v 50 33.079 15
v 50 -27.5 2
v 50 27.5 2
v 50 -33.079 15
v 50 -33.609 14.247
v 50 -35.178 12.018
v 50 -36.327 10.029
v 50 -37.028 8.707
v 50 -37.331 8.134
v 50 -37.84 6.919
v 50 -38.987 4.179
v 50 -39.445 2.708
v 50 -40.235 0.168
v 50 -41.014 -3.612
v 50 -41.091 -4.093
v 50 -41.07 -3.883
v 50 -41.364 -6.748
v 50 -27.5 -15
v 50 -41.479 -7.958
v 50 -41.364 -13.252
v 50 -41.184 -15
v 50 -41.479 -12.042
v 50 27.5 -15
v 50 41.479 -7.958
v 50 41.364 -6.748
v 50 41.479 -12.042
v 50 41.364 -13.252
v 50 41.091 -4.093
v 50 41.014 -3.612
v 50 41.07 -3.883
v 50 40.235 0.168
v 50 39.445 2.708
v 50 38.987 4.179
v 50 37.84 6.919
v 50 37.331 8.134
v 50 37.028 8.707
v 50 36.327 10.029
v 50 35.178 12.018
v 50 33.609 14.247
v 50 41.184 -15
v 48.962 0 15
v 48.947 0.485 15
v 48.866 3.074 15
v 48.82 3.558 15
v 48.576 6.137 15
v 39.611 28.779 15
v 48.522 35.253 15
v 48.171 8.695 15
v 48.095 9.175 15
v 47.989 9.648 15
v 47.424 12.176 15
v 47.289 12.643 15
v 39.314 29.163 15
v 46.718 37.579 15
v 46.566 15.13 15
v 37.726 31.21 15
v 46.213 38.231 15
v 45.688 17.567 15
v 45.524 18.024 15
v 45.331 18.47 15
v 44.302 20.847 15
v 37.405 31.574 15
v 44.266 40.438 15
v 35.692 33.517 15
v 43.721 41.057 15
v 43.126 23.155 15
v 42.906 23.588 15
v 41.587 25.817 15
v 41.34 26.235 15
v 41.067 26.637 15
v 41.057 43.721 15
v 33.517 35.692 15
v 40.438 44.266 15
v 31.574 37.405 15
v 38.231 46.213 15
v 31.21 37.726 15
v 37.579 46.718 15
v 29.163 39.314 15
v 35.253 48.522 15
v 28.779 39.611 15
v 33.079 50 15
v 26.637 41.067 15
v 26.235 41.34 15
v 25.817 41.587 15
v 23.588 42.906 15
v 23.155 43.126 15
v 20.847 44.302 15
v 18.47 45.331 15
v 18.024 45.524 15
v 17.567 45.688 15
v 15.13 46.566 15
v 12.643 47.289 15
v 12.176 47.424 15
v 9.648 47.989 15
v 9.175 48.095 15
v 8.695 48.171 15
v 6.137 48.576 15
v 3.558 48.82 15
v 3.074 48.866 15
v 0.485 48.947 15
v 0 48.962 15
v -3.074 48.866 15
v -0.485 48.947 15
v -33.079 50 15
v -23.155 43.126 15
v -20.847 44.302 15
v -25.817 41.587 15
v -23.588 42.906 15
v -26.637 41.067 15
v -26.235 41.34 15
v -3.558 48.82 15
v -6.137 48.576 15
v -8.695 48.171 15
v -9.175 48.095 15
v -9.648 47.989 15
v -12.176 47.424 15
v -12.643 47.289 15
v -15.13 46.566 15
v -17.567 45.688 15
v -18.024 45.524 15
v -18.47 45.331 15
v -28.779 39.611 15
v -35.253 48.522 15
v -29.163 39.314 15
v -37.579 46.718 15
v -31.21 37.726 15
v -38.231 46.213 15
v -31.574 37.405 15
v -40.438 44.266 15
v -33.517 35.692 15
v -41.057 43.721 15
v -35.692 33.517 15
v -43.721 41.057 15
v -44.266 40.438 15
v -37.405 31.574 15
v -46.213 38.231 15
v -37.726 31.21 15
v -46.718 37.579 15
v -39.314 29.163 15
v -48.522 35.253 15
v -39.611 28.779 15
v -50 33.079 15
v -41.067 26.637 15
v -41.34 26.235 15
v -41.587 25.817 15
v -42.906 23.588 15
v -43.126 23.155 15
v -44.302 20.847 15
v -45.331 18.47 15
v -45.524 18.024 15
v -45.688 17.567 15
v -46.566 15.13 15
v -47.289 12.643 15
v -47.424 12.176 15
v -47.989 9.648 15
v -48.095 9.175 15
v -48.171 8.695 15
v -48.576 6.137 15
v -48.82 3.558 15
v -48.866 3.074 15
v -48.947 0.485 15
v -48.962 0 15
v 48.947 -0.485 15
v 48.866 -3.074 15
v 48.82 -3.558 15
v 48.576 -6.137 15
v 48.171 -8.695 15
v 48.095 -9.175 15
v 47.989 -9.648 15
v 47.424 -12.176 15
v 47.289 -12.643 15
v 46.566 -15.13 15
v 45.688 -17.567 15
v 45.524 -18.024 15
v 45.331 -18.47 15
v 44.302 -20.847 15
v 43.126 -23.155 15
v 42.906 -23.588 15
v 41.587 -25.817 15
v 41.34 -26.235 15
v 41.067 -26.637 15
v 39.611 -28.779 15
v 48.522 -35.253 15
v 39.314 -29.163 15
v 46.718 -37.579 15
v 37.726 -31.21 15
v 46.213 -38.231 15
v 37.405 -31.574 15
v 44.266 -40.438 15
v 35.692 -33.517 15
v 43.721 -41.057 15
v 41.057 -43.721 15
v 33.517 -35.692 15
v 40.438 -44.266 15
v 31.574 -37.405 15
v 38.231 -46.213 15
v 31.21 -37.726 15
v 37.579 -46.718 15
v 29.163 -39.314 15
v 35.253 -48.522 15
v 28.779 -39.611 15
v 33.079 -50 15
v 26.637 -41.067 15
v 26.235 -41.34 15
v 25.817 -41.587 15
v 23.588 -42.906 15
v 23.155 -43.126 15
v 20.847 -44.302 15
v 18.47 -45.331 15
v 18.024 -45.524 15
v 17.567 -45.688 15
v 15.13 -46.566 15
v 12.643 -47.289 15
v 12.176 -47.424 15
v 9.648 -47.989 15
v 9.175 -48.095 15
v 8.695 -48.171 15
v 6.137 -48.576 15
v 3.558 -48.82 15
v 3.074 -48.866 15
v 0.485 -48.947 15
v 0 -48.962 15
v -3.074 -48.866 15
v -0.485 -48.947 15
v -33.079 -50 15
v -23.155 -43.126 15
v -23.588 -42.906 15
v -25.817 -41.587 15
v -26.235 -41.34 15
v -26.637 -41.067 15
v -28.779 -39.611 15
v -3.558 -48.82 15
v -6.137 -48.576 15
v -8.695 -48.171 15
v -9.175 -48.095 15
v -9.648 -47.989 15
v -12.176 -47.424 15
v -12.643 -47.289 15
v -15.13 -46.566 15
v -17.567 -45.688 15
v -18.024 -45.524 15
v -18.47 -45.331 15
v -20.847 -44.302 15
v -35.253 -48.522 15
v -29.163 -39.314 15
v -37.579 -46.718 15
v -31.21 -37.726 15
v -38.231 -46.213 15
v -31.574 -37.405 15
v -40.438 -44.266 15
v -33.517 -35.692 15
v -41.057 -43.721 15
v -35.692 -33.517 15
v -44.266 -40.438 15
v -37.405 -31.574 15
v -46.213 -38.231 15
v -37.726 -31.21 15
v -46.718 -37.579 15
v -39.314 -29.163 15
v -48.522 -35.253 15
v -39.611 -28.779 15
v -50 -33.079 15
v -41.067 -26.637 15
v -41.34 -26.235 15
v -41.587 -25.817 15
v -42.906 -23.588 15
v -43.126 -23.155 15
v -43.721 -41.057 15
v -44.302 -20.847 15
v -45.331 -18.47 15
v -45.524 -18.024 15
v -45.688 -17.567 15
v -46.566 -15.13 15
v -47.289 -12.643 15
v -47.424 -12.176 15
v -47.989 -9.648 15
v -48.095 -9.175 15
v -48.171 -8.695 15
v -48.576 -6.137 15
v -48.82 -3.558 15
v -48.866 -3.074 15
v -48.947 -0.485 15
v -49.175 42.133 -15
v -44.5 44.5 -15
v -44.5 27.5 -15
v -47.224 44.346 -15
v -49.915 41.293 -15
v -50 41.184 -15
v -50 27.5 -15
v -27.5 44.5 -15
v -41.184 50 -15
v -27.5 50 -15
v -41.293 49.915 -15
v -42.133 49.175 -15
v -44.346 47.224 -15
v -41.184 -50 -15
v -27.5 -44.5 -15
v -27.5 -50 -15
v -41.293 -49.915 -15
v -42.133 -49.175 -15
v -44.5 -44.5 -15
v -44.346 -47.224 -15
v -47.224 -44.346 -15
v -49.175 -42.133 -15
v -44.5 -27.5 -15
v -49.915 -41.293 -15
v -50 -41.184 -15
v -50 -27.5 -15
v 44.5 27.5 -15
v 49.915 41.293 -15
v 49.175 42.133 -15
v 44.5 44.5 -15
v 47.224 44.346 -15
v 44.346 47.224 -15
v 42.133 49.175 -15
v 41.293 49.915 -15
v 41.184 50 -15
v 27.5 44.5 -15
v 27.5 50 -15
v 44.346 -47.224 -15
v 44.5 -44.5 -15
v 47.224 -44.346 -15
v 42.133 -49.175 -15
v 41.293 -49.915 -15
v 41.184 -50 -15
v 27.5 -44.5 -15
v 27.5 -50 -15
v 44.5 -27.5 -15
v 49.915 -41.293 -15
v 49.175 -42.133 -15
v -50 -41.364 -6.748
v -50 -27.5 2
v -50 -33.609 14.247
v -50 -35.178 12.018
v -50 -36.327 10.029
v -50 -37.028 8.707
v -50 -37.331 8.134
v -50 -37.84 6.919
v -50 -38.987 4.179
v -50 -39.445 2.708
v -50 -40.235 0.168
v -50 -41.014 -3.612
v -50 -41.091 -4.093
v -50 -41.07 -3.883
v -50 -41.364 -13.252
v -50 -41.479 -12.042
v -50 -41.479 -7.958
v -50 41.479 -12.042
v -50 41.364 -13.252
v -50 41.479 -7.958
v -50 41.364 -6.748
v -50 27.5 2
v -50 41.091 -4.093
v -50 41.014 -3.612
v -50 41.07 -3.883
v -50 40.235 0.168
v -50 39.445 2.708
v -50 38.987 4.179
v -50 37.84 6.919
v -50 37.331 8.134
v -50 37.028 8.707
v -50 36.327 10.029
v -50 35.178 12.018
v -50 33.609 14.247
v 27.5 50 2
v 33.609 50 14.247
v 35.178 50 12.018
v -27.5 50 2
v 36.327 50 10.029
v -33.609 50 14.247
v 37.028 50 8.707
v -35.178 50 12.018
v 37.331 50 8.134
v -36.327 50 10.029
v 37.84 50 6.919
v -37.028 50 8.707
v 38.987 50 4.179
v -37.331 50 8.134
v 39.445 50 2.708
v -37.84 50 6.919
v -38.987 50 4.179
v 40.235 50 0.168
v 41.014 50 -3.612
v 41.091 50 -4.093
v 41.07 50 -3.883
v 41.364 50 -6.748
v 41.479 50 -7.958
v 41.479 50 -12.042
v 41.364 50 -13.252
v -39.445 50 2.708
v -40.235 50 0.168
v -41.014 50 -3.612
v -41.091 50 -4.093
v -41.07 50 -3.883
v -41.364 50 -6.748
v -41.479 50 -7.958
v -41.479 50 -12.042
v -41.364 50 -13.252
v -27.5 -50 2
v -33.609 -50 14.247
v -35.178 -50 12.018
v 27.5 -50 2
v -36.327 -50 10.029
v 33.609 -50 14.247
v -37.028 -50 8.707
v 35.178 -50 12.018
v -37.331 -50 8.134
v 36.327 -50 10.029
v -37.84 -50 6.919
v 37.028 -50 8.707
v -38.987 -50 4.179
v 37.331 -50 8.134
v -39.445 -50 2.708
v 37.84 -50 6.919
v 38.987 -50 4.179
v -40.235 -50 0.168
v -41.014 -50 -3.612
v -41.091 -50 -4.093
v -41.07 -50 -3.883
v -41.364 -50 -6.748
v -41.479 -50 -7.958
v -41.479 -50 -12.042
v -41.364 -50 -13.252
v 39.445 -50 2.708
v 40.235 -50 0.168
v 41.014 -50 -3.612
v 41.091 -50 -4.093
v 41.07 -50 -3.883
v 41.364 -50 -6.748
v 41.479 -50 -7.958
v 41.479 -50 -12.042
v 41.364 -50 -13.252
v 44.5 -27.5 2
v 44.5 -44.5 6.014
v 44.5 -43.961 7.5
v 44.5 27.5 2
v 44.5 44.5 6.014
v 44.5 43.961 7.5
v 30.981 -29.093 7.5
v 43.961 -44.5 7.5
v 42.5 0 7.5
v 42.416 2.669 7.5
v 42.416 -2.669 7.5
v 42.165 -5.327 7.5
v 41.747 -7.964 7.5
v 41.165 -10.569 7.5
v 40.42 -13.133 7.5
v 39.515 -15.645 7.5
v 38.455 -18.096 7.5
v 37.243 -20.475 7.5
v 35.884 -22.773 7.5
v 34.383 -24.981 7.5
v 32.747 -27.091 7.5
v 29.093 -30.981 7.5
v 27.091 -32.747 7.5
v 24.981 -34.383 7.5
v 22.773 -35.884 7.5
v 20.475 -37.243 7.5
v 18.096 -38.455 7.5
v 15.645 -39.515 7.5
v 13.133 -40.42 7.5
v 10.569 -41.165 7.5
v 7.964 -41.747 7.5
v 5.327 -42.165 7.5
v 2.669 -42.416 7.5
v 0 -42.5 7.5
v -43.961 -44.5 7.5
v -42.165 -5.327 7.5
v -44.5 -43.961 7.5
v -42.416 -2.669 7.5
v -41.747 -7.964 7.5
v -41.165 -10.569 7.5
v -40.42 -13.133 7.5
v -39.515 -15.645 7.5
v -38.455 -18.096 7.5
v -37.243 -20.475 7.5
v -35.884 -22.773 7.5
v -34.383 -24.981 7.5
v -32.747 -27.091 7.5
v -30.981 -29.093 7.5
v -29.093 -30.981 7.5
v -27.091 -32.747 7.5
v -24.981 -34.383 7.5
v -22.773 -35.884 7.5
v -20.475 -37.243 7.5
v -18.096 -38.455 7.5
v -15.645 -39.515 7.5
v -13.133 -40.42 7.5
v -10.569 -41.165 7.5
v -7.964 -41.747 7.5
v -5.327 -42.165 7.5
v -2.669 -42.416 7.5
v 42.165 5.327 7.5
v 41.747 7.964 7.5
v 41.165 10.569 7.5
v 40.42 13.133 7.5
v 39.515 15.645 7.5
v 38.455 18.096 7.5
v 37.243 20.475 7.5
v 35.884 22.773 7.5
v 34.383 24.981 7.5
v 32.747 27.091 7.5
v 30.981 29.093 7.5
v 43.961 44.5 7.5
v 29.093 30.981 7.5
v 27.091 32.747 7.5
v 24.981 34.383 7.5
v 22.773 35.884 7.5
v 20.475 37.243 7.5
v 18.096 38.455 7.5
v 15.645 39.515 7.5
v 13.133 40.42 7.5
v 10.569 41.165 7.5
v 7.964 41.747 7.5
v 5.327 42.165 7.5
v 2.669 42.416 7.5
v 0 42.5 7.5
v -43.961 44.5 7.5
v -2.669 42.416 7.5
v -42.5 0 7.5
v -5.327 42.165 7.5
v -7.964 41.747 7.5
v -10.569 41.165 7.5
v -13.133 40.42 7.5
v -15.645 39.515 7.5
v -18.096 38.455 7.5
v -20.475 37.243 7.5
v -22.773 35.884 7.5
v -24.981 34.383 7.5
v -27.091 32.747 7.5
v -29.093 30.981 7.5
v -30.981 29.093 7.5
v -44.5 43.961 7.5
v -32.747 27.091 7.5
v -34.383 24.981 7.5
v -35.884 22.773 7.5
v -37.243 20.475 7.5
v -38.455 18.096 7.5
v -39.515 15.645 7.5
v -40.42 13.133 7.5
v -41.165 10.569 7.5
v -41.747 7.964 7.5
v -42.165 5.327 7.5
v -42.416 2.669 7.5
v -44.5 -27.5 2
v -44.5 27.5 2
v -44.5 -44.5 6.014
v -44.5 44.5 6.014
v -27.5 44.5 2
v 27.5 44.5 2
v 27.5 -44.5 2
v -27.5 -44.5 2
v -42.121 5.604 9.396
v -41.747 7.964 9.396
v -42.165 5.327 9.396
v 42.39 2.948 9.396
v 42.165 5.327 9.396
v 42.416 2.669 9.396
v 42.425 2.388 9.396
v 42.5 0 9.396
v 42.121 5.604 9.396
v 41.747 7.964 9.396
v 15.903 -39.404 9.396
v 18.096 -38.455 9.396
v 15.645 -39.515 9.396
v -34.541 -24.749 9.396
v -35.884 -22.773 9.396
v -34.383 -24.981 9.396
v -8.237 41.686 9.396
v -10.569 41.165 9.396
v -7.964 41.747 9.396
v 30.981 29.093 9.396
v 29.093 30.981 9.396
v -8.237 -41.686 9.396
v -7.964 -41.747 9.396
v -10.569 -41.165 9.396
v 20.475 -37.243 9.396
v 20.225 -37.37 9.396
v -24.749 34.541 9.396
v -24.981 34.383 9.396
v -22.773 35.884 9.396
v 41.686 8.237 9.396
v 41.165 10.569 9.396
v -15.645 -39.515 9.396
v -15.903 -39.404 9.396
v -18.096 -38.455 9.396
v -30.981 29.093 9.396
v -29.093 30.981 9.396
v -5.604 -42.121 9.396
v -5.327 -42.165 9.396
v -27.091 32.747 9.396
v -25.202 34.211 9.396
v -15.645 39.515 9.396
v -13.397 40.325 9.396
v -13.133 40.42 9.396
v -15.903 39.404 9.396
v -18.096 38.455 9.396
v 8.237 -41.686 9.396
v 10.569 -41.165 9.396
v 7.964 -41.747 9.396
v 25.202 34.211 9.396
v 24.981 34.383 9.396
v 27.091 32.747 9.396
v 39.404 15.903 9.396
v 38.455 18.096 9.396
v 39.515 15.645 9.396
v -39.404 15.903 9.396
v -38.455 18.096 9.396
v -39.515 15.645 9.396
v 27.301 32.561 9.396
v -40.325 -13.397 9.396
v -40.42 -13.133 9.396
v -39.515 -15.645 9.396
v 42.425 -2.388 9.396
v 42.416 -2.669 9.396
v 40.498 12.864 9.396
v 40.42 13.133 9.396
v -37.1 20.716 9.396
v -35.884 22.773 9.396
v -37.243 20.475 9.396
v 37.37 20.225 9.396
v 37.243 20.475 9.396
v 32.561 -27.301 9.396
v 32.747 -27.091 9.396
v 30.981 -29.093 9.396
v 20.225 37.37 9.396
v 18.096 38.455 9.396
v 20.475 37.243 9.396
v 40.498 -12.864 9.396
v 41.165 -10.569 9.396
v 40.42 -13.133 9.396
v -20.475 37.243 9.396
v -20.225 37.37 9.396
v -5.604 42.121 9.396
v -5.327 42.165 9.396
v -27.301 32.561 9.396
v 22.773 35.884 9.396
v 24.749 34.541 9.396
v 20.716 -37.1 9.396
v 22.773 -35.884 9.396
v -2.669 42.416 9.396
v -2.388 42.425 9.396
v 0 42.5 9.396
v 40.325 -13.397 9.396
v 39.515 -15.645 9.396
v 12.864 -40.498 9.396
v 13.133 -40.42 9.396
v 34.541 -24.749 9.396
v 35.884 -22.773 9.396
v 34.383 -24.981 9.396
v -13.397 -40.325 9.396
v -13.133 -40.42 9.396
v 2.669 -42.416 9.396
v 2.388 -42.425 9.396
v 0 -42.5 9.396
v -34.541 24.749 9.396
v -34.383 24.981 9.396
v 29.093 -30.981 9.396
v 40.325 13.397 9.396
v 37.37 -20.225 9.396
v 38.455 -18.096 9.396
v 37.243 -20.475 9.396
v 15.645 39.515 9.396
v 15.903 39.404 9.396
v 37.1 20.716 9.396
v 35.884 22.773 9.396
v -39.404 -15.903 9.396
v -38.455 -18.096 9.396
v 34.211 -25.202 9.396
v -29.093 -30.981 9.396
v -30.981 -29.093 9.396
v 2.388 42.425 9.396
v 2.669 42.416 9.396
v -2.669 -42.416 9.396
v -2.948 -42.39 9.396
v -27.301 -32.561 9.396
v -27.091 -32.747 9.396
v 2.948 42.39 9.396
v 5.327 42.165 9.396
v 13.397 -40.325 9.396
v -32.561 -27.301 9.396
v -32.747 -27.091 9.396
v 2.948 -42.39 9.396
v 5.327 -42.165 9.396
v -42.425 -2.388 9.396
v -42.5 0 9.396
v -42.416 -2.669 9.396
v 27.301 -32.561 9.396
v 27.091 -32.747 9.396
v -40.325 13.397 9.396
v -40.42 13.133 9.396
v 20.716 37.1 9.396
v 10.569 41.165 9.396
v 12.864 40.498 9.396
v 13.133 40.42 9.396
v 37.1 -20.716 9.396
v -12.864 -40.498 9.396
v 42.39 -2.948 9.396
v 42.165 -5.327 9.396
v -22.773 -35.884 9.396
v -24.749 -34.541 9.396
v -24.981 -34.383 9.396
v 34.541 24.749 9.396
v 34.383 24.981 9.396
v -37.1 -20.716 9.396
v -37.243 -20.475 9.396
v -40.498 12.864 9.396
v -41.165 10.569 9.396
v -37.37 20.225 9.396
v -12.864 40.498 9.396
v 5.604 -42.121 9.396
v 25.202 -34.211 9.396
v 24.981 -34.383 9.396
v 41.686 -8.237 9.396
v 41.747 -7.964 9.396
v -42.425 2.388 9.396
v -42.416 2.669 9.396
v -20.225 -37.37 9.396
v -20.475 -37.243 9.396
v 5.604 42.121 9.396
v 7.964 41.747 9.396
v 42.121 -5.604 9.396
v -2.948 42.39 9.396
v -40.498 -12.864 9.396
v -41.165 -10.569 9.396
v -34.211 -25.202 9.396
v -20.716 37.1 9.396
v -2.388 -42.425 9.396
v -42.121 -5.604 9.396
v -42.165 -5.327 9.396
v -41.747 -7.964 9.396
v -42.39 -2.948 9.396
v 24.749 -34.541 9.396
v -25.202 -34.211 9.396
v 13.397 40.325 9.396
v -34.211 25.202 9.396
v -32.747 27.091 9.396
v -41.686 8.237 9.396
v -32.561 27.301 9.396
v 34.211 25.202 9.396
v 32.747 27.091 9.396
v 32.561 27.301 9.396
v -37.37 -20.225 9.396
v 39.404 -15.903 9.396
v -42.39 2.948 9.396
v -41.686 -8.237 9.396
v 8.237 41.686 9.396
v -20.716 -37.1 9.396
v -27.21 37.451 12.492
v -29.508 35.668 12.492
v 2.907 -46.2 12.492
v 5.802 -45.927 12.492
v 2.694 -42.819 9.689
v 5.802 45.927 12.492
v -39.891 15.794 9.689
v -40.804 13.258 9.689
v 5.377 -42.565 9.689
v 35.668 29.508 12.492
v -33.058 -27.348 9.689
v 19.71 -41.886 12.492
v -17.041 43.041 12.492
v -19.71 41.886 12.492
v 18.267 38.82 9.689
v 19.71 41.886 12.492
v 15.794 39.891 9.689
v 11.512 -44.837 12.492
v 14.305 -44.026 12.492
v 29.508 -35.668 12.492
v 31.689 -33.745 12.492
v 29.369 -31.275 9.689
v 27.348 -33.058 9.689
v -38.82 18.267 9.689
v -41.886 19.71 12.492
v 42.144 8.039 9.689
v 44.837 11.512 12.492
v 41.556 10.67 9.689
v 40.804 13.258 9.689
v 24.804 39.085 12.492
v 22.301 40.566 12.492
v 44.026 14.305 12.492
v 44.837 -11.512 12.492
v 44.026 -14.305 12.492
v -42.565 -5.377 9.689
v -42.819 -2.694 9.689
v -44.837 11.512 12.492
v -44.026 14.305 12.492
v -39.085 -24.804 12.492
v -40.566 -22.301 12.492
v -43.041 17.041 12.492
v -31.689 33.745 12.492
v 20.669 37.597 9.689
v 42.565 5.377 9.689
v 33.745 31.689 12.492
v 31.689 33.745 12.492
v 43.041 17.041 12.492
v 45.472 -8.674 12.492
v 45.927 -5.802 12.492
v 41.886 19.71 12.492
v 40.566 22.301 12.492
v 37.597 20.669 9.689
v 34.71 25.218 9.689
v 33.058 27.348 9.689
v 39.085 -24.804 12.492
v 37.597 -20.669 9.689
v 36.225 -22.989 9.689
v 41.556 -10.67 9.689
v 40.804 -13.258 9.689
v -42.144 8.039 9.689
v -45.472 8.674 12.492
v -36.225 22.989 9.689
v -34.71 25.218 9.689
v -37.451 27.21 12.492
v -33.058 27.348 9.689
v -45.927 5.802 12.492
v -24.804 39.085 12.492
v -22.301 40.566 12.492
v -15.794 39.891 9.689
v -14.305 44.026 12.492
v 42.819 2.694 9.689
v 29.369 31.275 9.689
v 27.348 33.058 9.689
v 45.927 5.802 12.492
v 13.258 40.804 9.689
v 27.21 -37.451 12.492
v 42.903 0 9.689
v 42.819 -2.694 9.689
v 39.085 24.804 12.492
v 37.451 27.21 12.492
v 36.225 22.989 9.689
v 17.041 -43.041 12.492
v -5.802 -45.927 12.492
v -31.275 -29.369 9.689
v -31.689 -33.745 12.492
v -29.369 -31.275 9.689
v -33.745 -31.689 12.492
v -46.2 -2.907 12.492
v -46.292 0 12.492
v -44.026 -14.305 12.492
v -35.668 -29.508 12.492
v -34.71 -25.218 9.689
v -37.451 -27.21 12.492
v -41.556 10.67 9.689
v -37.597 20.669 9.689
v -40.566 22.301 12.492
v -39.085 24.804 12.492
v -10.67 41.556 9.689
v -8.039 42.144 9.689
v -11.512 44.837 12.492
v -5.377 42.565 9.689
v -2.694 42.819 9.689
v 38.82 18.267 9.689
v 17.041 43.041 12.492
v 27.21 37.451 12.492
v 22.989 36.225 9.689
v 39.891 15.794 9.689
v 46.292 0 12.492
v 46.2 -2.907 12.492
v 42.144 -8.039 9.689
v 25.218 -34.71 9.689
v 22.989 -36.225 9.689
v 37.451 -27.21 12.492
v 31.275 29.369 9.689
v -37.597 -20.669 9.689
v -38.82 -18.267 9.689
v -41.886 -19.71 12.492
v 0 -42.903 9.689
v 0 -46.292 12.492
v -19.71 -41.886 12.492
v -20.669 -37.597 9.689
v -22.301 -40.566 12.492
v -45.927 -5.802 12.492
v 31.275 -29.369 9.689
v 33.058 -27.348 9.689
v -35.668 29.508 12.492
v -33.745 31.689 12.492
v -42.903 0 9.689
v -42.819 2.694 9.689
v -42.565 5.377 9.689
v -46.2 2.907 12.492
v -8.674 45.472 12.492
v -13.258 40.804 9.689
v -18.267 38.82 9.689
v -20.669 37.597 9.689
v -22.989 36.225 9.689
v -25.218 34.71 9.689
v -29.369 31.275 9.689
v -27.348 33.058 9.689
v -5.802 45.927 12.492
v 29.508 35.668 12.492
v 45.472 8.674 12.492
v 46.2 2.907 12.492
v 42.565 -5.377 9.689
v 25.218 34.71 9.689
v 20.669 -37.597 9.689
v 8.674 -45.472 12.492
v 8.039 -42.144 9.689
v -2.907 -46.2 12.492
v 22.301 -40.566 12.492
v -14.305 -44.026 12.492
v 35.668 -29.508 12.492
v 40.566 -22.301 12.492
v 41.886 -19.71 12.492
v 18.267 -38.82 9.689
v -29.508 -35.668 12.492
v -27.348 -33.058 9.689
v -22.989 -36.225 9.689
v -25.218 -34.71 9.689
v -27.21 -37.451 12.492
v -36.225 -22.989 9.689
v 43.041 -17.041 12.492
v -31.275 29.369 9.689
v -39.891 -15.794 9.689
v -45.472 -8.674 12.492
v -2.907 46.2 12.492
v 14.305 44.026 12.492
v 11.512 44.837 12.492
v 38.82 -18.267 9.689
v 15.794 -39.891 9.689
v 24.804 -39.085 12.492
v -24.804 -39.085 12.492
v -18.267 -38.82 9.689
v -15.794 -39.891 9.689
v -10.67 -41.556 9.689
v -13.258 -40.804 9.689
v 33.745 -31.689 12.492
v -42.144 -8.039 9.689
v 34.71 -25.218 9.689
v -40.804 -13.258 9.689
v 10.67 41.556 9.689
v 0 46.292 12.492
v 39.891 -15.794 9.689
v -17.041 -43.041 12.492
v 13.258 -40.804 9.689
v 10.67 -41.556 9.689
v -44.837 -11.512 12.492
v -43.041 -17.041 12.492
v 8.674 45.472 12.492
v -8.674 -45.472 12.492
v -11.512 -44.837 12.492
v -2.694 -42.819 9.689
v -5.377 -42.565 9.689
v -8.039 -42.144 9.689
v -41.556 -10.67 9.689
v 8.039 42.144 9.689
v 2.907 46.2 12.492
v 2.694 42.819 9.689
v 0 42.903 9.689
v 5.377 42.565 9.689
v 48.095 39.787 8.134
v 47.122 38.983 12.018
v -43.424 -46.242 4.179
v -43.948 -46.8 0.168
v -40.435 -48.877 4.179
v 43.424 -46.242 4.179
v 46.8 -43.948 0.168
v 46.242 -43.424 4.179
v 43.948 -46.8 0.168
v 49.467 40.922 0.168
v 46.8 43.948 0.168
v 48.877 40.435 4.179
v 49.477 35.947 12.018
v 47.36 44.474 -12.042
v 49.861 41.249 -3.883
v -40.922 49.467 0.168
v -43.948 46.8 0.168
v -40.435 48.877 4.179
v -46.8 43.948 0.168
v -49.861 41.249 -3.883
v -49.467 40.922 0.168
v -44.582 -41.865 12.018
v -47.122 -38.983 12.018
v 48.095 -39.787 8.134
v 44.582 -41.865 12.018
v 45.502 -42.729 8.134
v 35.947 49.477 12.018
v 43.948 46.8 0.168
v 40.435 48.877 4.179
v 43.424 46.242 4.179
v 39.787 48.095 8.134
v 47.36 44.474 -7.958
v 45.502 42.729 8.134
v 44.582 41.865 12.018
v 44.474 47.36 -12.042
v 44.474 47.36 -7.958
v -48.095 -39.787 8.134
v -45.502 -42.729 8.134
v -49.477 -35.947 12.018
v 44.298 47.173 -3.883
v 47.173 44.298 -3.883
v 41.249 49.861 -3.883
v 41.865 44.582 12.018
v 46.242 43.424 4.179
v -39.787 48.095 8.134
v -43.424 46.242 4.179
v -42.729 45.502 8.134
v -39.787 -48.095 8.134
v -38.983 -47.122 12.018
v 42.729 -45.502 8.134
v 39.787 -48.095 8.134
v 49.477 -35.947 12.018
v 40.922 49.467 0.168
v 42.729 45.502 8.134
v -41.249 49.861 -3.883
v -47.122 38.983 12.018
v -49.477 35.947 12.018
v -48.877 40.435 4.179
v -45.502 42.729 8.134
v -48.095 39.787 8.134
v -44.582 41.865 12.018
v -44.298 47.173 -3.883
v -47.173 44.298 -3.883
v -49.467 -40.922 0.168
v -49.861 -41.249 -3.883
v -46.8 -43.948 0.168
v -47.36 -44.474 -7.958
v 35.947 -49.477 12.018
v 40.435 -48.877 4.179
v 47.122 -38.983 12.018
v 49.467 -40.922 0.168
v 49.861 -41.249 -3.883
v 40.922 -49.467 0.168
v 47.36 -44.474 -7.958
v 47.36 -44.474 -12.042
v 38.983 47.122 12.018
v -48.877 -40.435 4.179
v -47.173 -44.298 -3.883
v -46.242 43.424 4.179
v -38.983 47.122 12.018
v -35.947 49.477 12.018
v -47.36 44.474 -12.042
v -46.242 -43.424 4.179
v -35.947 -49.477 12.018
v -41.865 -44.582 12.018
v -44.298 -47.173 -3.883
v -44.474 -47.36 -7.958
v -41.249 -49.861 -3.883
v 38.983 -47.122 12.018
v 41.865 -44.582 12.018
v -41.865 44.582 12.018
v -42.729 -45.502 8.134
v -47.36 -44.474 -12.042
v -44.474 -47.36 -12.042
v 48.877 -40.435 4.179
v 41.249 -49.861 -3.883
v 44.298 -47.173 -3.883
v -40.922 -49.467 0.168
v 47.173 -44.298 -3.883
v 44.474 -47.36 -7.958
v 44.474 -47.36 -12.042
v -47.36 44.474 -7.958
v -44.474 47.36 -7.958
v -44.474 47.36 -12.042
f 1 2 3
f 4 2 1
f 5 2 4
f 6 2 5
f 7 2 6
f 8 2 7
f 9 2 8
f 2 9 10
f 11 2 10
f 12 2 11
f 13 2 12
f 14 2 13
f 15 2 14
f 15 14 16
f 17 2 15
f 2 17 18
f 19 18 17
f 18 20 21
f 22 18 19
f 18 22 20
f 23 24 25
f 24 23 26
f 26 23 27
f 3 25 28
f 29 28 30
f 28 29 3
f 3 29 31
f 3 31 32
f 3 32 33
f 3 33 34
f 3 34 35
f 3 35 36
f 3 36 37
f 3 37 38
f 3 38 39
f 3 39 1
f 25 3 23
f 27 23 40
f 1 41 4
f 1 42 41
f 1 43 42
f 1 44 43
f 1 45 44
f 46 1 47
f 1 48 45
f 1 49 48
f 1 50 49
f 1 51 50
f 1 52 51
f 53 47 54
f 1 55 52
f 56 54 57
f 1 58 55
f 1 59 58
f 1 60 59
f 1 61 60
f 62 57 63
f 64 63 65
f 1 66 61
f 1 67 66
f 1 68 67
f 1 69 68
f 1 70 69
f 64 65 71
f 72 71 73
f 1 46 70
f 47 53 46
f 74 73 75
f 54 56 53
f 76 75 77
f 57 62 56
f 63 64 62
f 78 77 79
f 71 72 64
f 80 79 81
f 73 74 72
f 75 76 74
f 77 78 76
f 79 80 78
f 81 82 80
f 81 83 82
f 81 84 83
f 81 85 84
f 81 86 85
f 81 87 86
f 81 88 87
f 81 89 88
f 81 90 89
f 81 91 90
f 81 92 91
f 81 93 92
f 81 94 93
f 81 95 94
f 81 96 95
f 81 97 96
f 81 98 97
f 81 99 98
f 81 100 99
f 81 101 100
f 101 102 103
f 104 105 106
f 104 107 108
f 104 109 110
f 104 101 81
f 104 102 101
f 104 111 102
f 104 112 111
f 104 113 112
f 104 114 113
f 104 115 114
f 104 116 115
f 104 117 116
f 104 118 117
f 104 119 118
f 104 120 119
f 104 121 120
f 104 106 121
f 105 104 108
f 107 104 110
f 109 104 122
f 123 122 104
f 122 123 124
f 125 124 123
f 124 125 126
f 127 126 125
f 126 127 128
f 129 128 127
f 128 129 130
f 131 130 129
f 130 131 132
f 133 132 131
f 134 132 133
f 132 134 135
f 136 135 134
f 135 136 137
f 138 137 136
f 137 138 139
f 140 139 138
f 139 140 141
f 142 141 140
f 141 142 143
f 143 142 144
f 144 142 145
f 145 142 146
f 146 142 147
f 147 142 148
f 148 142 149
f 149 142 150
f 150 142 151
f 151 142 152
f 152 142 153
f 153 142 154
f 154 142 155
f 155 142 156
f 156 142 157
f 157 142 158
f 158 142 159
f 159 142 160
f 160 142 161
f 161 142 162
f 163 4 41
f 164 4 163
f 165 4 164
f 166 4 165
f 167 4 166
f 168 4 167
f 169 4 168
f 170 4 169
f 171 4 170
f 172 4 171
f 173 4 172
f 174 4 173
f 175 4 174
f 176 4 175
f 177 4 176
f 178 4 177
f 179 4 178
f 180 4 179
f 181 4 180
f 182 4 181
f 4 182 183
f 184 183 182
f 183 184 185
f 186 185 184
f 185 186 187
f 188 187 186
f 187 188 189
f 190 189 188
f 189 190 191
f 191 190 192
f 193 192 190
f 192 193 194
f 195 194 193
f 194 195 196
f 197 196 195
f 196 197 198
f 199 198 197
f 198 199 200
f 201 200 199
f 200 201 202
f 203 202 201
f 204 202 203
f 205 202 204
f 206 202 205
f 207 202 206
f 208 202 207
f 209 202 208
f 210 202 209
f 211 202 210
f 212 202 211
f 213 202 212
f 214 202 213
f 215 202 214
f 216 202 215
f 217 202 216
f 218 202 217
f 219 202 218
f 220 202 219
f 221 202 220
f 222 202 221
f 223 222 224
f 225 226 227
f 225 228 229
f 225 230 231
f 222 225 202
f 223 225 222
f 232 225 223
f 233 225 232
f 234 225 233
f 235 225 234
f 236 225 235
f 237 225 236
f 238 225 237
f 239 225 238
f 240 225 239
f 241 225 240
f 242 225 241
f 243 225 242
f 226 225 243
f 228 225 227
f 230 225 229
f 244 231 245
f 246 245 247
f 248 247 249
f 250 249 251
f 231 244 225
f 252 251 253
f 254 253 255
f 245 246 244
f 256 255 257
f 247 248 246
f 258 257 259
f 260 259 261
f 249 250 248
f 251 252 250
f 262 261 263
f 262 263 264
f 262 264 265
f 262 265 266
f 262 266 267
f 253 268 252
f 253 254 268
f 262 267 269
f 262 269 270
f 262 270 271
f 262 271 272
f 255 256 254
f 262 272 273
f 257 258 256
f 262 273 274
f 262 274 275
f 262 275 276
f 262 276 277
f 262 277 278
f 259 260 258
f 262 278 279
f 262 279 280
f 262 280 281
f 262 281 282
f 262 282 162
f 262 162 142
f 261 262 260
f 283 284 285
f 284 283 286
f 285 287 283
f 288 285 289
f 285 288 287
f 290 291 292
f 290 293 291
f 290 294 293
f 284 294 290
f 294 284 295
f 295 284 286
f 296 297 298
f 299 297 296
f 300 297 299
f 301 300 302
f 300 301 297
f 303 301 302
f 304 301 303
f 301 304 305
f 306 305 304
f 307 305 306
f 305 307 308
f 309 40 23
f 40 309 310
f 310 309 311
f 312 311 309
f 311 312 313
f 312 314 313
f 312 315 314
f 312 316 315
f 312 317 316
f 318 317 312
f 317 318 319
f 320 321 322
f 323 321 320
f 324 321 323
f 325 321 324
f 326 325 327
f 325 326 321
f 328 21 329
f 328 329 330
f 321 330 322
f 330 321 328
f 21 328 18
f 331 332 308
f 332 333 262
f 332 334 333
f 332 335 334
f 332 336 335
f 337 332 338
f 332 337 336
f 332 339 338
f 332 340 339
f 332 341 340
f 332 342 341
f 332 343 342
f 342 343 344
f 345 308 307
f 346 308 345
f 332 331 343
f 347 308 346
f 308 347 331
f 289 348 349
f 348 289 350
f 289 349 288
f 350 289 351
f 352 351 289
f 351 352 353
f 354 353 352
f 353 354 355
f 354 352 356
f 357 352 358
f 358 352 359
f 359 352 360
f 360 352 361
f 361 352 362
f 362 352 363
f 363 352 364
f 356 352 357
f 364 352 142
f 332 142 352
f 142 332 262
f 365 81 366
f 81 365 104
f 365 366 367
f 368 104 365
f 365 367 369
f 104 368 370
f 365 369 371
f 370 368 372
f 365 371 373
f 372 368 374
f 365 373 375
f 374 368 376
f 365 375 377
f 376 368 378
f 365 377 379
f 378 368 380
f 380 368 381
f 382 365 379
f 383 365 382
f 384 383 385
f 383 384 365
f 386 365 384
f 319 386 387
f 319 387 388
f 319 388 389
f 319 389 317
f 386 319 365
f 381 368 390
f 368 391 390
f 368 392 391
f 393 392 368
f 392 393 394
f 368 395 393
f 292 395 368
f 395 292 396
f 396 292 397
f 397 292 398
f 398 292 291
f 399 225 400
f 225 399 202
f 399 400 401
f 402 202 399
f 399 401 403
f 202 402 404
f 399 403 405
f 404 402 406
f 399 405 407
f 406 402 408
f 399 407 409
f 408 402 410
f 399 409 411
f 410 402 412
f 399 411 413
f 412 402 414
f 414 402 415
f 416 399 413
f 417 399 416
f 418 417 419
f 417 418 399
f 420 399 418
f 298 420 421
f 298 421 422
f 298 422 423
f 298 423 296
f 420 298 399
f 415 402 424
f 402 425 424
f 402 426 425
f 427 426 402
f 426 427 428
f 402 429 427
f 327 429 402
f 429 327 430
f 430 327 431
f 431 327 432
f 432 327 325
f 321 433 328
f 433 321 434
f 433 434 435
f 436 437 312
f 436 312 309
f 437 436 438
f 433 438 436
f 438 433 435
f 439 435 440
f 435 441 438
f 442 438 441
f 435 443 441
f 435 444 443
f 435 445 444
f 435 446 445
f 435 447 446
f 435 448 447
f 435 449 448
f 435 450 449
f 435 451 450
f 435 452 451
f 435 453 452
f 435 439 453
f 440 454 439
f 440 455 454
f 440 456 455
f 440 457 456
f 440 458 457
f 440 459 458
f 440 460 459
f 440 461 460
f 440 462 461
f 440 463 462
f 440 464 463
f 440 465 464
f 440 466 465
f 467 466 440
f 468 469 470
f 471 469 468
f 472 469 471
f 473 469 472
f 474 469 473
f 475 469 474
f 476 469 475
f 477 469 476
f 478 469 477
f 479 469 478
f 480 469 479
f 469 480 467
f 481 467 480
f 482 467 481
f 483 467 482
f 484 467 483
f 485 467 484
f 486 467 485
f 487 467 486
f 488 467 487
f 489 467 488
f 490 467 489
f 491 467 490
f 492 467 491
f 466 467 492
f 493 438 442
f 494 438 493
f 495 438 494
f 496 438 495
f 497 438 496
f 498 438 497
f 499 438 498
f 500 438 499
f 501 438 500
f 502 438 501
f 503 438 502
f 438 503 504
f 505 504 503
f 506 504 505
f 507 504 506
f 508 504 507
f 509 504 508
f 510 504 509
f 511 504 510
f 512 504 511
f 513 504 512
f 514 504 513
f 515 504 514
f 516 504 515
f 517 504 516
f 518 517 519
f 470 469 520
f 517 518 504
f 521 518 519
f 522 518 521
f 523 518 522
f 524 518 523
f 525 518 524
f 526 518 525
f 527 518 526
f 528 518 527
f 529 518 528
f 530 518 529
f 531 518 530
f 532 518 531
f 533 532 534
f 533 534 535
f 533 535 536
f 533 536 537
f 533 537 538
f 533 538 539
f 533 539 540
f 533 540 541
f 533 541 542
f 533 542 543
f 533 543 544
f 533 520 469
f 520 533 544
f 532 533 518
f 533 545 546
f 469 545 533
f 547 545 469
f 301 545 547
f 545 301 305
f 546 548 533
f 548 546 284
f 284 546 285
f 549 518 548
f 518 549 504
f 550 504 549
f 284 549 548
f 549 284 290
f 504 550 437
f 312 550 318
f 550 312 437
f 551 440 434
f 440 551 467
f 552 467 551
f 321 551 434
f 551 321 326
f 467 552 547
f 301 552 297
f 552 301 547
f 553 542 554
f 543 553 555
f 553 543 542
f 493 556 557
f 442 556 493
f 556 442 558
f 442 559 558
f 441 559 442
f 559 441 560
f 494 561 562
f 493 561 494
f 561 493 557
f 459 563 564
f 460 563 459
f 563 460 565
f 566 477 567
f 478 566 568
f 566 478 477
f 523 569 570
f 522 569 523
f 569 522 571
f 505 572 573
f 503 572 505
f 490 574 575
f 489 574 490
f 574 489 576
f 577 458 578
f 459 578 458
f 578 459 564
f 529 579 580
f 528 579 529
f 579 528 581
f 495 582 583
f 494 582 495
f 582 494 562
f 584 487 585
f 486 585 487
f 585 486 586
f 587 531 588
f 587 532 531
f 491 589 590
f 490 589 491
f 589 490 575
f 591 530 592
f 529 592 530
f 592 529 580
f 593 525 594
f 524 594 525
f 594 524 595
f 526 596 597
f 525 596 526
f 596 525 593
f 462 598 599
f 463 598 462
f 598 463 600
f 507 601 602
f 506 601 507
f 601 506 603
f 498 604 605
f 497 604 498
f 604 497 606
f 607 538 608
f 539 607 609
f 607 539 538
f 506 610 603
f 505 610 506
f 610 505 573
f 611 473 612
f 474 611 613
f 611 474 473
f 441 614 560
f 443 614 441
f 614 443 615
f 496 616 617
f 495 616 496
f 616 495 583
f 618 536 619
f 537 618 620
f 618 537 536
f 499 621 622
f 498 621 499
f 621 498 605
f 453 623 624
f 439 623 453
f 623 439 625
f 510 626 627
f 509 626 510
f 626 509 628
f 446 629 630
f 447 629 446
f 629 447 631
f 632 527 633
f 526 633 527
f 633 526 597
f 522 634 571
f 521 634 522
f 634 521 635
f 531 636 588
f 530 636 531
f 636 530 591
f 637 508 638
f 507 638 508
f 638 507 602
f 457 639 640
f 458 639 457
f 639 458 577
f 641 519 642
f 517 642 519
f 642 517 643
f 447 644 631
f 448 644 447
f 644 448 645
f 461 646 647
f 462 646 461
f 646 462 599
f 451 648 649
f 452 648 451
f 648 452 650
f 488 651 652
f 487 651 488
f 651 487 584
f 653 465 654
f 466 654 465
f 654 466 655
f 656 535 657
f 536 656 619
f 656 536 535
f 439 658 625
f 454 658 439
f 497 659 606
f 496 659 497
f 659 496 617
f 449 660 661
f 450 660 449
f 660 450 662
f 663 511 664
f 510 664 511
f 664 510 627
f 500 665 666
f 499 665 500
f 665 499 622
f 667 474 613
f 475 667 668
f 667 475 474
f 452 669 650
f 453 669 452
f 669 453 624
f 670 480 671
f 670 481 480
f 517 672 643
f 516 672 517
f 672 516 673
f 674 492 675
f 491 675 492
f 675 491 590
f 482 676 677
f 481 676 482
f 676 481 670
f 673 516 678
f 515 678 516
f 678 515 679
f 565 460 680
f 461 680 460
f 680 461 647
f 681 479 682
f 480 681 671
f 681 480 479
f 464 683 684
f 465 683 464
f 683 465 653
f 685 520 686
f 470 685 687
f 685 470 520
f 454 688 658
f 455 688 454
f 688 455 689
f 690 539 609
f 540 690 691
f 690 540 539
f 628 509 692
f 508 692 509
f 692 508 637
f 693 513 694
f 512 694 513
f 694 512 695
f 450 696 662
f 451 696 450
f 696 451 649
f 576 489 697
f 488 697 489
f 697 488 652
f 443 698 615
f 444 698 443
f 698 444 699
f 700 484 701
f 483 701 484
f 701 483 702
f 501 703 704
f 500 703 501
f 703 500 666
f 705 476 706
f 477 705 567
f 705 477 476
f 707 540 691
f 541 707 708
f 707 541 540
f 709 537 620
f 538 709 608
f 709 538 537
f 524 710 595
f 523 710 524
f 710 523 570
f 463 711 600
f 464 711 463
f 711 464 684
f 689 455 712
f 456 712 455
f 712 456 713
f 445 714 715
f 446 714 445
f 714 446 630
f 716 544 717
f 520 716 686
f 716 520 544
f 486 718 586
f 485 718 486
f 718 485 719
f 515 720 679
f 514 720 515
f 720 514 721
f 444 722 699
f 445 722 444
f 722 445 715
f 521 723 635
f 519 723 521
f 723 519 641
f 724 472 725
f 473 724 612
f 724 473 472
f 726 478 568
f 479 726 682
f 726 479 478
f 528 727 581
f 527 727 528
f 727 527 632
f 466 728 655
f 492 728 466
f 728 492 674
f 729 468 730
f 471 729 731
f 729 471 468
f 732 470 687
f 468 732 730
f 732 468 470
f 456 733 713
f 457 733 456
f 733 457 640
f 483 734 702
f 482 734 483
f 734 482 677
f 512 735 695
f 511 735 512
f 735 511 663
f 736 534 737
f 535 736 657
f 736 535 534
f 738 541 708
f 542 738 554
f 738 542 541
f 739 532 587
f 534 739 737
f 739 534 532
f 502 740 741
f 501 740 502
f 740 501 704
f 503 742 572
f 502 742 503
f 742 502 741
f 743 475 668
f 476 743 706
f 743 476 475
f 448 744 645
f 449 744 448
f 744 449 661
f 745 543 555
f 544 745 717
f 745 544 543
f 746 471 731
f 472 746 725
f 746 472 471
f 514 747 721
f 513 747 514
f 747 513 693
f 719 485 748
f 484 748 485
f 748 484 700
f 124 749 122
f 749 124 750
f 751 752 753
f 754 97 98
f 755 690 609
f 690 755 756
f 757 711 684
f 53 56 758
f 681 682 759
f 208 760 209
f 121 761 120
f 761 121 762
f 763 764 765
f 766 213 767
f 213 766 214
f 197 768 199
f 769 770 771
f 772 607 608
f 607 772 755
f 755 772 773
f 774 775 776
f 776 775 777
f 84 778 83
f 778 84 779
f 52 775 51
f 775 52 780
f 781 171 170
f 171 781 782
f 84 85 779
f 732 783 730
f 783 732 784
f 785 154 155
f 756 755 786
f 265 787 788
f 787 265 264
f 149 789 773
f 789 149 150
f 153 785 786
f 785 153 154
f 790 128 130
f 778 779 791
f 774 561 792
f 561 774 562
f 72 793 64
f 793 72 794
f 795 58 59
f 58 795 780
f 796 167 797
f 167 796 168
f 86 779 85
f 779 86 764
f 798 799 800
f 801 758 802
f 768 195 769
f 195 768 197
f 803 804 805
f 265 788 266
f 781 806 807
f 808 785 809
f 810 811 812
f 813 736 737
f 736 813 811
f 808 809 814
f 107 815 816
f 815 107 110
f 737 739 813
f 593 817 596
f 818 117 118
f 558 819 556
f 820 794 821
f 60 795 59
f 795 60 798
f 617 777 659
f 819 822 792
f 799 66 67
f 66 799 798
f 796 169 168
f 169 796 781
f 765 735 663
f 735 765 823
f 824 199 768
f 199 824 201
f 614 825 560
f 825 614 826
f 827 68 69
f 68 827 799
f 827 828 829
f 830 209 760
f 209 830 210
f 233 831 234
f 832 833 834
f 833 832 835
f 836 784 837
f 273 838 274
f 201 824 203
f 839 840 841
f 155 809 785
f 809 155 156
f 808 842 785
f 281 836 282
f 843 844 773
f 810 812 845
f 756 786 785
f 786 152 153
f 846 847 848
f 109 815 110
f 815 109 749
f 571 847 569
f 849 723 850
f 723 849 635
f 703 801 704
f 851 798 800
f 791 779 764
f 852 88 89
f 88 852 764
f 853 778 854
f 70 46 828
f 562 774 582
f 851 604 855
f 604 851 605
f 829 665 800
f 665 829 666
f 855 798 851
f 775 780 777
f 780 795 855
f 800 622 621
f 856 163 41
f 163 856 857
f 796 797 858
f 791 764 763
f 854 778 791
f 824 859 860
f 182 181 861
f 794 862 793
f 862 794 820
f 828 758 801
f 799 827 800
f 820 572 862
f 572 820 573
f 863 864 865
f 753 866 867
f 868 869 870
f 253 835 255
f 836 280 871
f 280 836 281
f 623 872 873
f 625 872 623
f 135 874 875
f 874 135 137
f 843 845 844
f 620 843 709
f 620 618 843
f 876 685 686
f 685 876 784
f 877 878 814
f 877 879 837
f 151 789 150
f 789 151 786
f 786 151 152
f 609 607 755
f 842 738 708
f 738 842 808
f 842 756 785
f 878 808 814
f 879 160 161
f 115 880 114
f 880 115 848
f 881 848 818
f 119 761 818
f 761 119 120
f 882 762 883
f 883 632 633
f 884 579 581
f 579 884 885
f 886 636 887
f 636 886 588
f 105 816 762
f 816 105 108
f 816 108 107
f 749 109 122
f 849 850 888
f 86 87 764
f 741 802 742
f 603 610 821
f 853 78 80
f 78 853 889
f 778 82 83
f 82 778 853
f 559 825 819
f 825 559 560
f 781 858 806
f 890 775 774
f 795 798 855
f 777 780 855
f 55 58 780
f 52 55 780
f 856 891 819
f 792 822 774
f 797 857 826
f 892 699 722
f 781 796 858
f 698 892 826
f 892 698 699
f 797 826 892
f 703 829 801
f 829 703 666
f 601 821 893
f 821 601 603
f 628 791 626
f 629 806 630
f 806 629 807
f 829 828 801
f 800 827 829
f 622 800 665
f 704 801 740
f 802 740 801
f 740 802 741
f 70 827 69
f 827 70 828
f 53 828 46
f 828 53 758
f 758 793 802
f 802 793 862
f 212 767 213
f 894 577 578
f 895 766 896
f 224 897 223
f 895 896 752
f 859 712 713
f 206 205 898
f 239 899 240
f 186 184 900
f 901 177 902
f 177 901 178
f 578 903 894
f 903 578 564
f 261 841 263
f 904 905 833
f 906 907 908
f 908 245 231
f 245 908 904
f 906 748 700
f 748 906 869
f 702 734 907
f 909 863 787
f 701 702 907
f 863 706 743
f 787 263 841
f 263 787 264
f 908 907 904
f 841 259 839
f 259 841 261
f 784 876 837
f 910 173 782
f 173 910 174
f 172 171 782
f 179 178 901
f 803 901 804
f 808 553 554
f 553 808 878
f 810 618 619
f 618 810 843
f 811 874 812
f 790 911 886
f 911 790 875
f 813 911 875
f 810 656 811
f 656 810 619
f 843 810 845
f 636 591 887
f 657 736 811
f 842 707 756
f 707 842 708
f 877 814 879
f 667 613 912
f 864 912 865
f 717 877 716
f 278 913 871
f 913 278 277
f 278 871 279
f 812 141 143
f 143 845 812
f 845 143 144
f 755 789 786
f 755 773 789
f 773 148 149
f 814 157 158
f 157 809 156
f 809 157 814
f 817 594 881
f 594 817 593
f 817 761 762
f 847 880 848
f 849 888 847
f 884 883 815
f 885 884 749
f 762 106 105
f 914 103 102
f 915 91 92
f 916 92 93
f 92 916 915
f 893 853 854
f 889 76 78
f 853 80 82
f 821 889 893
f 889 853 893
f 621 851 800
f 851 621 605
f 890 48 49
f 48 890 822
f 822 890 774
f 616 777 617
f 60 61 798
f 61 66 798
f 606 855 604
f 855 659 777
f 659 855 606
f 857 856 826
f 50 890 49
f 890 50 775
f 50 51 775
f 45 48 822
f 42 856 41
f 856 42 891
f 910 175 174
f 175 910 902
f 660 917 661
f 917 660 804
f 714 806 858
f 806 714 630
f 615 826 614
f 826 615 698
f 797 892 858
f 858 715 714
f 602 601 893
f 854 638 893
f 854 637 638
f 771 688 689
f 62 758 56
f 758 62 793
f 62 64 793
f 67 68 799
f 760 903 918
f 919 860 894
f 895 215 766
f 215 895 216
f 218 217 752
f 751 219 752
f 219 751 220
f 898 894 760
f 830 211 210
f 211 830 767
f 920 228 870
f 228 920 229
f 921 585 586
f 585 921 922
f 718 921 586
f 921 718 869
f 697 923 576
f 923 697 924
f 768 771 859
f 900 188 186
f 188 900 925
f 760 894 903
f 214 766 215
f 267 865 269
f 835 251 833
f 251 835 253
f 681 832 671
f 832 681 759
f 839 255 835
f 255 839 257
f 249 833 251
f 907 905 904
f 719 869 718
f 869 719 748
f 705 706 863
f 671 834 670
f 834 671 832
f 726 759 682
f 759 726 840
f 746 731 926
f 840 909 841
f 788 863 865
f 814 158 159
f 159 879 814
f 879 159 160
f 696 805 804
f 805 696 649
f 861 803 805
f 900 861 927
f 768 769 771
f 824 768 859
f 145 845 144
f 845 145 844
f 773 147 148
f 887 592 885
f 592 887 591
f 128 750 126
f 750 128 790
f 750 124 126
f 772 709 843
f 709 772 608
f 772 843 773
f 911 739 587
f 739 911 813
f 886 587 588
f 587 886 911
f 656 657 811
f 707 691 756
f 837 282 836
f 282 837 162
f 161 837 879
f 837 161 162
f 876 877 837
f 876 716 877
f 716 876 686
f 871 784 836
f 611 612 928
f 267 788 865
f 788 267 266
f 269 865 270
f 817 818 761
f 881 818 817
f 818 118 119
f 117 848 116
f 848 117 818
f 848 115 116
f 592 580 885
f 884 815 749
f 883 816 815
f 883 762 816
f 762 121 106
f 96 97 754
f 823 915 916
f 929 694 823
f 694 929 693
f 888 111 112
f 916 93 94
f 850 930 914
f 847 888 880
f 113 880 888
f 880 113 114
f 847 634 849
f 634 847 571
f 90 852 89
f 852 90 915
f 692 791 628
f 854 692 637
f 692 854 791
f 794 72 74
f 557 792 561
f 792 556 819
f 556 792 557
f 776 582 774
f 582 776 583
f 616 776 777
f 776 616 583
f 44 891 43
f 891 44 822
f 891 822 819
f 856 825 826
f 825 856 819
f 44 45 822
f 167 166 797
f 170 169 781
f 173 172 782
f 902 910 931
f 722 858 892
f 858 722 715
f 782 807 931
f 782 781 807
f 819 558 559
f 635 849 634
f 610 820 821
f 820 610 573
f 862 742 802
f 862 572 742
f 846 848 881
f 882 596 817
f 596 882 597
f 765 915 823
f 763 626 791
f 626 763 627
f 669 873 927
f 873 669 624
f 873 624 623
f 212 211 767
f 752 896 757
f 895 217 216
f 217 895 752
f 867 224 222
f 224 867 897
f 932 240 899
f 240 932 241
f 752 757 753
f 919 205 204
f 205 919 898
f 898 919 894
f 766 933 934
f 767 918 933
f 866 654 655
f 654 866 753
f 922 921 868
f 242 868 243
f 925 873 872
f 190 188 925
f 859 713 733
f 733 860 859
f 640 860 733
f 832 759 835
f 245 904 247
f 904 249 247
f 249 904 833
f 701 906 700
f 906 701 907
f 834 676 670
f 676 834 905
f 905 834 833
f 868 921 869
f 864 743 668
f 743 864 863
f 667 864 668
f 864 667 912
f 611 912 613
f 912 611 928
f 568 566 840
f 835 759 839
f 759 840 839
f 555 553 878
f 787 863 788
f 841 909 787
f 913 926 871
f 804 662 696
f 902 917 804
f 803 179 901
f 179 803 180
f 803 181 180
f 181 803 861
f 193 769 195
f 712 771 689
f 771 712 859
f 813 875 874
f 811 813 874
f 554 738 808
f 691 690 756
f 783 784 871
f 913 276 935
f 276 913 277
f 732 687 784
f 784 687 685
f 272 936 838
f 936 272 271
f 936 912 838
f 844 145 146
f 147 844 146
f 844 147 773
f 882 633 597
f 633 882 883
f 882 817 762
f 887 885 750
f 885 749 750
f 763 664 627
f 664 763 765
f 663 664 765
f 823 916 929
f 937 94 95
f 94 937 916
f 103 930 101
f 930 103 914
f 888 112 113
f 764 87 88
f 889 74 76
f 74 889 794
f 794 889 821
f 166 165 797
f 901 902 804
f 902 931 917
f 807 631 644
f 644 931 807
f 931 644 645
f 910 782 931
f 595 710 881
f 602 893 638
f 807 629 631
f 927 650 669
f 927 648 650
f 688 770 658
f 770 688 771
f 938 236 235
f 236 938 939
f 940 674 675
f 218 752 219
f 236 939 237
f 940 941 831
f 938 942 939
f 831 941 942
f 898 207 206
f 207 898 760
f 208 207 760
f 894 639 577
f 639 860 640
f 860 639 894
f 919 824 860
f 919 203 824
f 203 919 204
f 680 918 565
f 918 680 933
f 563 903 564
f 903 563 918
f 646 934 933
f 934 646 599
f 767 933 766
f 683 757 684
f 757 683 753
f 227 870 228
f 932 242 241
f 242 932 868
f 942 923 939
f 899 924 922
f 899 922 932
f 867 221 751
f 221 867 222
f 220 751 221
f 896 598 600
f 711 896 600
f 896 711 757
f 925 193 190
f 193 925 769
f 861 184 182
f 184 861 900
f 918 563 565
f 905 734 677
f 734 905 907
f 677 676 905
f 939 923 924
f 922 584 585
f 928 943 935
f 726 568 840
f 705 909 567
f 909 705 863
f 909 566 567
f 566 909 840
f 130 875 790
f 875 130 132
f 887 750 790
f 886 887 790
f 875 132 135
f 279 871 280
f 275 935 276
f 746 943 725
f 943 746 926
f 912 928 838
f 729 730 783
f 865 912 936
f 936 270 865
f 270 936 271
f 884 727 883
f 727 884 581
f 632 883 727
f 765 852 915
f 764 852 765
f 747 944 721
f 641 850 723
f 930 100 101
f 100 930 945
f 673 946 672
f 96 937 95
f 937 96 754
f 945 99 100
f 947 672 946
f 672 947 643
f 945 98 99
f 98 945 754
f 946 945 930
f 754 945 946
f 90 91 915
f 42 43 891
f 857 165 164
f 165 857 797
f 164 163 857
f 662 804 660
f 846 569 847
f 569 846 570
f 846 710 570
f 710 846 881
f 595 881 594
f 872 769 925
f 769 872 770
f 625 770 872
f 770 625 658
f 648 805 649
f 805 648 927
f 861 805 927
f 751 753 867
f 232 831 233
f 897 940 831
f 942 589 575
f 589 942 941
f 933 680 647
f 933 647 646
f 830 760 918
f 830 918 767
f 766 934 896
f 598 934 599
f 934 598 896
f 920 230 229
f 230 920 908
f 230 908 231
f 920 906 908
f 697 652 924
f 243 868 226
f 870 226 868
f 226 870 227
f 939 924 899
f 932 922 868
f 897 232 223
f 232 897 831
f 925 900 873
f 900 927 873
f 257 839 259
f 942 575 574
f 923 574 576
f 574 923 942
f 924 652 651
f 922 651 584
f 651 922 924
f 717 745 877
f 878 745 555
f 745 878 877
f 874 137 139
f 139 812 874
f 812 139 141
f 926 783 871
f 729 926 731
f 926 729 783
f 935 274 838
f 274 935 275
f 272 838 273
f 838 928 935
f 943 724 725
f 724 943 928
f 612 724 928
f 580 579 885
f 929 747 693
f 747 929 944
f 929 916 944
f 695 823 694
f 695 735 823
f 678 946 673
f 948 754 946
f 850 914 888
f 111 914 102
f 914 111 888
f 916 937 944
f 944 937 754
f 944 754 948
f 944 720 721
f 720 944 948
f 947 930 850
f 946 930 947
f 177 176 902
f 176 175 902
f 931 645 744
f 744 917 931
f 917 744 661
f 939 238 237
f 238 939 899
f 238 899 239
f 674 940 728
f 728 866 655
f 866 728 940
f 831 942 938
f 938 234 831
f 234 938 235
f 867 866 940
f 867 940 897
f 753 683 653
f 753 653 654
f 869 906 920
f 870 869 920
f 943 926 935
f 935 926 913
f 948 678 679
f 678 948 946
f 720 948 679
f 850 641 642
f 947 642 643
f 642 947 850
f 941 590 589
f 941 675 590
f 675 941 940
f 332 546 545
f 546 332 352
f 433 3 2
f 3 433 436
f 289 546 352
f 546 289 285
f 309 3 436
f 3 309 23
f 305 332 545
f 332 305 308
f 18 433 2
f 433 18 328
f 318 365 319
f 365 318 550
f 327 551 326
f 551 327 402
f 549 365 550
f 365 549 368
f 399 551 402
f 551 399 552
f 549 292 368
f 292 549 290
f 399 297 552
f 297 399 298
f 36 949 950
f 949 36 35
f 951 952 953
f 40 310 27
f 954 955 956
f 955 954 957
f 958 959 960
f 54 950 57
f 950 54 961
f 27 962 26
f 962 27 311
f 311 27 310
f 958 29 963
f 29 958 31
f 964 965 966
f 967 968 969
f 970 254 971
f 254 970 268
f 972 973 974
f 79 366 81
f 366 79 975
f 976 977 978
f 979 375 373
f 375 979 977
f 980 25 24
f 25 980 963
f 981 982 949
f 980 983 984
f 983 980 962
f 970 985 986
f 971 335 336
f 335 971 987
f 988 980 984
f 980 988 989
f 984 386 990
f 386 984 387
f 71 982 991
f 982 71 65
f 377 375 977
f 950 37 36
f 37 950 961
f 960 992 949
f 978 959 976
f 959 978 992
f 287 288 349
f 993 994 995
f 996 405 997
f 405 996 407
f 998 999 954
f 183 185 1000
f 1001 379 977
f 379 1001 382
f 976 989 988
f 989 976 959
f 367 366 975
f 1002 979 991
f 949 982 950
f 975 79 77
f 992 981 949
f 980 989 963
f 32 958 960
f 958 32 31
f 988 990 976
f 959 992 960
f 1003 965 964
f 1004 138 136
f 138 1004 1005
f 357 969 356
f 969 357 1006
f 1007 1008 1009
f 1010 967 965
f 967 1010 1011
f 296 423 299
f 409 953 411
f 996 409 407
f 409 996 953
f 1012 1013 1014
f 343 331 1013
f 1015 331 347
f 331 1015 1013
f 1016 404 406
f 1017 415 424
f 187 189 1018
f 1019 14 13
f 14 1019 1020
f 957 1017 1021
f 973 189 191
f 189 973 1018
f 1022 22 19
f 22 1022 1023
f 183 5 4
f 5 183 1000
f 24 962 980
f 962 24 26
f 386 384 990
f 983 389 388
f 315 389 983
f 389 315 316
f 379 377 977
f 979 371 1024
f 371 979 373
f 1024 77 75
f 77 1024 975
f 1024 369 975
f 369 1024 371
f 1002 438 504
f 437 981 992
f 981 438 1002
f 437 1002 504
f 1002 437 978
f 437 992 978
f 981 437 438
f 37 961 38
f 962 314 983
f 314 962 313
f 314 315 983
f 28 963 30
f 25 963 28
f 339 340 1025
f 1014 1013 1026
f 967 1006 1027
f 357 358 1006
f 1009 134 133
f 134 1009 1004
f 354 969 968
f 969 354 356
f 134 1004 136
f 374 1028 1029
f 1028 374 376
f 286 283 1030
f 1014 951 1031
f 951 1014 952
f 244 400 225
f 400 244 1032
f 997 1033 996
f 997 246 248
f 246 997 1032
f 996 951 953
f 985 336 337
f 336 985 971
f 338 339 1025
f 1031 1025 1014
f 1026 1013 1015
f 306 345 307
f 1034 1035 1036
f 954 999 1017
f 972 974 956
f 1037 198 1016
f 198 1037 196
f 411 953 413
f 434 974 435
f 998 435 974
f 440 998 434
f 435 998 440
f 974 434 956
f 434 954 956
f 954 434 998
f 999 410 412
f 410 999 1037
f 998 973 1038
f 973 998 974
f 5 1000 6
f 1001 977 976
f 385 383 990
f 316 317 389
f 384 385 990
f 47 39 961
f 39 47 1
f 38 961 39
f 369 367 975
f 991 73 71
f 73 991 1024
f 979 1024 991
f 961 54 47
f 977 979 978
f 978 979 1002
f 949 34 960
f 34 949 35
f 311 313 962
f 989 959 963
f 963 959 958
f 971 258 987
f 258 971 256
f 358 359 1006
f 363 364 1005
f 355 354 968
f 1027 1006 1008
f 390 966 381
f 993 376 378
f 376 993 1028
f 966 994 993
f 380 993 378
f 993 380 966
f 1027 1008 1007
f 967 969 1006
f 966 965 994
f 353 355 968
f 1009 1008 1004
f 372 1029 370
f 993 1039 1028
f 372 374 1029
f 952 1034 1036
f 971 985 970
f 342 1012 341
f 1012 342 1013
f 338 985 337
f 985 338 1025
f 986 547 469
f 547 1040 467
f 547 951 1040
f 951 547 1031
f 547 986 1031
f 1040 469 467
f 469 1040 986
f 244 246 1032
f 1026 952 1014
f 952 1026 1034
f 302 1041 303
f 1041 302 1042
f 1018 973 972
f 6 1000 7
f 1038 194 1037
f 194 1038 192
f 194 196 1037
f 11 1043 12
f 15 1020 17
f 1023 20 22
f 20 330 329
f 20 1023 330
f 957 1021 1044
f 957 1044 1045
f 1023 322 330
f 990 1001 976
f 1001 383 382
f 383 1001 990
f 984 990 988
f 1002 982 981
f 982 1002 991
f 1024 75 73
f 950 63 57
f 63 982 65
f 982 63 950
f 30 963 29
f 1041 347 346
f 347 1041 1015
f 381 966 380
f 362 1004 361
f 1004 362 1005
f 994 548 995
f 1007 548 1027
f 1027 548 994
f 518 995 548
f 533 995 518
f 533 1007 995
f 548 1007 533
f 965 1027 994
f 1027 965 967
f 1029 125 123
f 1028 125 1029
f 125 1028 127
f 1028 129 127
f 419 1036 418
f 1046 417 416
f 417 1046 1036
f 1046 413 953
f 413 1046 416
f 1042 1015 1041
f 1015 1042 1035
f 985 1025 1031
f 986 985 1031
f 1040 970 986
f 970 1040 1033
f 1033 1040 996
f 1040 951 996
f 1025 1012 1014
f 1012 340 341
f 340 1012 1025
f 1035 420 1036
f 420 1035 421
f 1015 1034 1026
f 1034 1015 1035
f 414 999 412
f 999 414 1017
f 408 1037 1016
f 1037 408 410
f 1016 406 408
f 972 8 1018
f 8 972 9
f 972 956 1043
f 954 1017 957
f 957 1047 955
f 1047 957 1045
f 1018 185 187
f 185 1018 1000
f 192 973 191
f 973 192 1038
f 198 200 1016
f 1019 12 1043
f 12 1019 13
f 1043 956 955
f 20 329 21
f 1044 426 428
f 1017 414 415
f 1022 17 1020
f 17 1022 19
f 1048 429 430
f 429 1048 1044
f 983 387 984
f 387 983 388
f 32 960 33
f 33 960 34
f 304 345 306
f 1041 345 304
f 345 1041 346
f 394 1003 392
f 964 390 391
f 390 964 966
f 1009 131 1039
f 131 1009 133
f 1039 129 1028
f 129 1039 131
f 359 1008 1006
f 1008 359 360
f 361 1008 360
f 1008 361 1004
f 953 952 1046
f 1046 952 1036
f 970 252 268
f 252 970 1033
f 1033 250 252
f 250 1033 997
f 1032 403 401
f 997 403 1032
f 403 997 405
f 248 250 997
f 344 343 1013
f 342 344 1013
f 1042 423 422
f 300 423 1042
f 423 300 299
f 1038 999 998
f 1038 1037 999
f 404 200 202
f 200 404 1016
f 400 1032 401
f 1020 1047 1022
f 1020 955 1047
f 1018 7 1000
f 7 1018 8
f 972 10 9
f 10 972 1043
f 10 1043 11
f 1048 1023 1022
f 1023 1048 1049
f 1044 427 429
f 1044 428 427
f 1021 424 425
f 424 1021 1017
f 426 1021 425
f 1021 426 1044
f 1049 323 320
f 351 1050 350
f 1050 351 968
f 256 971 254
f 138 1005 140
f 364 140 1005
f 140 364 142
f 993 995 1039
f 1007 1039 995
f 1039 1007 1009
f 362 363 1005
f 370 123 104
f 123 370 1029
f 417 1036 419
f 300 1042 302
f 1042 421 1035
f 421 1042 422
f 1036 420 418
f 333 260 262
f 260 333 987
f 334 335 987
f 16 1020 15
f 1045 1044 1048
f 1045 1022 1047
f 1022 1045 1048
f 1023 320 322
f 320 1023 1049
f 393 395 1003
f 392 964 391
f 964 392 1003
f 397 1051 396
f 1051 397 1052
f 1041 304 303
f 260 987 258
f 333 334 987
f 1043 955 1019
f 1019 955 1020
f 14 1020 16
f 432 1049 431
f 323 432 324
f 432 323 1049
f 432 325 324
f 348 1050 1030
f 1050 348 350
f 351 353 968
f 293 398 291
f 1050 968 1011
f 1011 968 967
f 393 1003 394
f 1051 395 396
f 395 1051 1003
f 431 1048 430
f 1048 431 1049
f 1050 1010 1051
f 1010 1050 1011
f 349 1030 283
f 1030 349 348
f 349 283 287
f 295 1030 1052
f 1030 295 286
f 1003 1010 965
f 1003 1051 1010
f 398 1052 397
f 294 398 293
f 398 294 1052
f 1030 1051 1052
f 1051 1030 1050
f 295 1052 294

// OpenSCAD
// WASABI Niko FDM Printer
// Cooler cover
// GNU GPL v3
// SANTA no Mix
// https://ameblo.jp/math-physics/theme-10117154956.html
// https://github.com/SantaNoMix/
$fn = 100;
intersection () {
difference () {
cube ([100,100,30],center = true);
translate ([0,0,-5]) {
cube ([89,89,25],center = true);
}
  translate ([0,0,15]) {
            cylinder (50,42.5,42.5,center = true);
        }
 translate ([0,0,65]) {
 sphere (70);
 }
     translate ([0,0,-18]) {
    cube ([120,55,40],center = true);
}
    translate ([0,0,-18]) {
    cube ([55,120,40],center = true);
}
 }
 translate ([0,0,-10]) {
 sphere (65);
 }
 }
